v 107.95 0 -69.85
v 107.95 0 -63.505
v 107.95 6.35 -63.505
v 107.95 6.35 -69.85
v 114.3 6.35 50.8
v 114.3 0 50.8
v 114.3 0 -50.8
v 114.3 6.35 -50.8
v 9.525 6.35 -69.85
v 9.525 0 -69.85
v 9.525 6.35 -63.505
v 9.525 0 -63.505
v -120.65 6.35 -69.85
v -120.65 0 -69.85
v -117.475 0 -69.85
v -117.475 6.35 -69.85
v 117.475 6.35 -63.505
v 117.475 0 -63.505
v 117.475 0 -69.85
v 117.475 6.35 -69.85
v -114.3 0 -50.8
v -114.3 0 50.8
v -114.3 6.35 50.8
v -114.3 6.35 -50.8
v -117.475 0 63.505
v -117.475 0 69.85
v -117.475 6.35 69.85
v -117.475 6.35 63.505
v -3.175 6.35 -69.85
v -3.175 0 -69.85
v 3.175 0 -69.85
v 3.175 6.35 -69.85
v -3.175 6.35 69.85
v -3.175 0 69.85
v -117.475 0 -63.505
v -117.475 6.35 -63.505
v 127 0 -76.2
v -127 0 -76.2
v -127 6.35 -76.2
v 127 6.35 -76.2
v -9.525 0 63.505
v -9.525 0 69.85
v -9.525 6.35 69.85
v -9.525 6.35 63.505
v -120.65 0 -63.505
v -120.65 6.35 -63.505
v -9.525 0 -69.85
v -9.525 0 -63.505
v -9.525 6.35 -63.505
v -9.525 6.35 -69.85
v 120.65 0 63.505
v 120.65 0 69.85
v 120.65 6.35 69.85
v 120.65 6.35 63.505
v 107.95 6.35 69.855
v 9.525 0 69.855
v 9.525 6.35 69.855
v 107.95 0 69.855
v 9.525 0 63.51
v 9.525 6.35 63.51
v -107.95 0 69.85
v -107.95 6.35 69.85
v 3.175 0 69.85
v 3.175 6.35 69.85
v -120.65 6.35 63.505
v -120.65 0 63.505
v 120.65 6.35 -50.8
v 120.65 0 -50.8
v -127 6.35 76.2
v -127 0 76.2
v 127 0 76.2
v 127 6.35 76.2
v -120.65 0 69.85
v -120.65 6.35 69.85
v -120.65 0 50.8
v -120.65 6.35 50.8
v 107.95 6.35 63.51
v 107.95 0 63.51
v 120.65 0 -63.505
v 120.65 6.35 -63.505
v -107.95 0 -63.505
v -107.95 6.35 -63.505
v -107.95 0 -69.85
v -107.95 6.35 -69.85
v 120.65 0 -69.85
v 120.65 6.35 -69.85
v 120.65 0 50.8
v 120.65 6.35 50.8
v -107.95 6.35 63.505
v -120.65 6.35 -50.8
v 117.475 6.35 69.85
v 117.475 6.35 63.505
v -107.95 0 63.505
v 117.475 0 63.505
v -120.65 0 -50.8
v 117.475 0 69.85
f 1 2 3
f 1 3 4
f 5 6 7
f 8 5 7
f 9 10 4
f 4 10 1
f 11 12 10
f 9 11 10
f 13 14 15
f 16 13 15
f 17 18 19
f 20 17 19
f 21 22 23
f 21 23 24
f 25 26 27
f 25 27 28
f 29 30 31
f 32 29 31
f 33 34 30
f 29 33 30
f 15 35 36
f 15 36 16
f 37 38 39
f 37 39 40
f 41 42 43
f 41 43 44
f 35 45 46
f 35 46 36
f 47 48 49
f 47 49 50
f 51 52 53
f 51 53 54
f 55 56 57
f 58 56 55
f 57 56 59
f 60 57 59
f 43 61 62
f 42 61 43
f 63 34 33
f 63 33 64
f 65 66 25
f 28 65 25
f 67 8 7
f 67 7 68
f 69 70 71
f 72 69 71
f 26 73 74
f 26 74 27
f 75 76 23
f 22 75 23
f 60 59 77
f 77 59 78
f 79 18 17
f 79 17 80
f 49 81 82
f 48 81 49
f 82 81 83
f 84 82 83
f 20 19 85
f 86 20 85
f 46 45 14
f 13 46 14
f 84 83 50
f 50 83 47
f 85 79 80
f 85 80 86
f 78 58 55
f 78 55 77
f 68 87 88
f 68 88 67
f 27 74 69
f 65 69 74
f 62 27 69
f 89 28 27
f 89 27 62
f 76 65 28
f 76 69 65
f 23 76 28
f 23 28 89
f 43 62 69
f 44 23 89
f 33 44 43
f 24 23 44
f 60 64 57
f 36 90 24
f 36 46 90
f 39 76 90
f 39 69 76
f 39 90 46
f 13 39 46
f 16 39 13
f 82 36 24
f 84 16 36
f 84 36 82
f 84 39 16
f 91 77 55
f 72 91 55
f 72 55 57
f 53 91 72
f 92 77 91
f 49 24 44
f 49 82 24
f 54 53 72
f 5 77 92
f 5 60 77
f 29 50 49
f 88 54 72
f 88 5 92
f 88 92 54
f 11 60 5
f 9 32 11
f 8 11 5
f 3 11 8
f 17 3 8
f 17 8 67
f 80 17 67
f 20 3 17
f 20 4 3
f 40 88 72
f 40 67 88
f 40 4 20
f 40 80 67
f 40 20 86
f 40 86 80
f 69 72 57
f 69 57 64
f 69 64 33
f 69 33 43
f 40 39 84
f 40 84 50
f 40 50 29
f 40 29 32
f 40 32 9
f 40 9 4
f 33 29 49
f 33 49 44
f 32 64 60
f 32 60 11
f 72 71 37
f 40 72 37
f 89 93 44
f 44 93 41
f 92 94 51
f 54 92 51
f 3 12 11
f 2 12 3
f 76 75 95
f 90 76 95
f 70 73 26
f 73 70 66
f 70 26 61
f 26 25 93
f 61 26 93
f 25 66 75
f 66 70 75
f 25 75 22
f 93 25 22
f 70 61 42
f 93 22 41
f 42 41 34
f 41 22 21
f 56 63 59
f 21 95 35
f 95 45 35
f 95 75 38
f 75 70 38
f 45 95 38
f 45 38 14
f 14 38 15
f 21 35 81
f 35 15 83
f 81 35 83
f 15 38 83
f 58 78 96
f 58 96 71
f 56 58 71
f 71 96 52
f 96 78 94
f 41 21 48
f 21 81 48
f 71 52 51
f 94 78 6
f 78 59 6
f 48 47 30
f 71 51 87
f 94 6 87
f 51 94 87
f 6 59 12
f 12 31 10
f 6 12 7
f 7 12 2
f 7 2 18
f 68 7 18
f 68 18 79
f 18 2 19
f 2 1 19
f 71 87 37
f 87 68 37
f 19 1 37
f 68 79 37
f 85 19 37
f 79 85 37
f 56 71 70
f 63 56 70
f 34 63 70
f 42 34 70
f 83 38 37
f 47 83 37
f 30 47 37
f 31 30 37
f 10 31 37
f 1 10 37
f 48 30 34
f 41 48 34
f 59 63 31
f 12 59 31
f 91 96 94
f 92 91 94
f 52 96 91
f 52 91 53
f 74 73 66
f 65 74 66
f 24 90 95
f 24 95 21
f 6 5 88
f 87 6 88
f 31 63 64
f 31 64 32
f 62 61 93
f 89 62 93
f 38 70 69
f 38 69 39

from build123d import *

# Parameters (mm, degrees)
SKETCH1_W           = 254
SKETCH1_H           = 152.4
SKETCH1_W_2         = 6.35
SKETCH1_H_2         = 101.6
SKETCH1_H_3         = 139.7
SKETCH1_W_3         = 98.425
SKETCH1_H_4         = 6.34492
SKETCH1_W_4         = 3.175
BOSS_EXTRUDE1_DEPTH = 6.35


with BuildPart() as part:
    # Sketch1 → Boss-Extrude1 (new body)
    with BuildSketch(Plane(origin=(0, 0, 0), x_dir=(1, 0, 0), z_dir=(0, 1, 0))):
        Rectangle(SKETCH1_W, SKETCH1_H)
        with Locations((117.475, 0)):
            Rectangle(SKETCH1_W_2, SKETCH1_H_2, mode=Mode.SUBTRACT)
        Rectangle(SKETCH1_W_2, SKETCH1_H_3, mode=Mode.SUBTRACT)
        with Locations((-117.475, 0)):
            Rectangle(SKETCH1_W_2, SKETCH1_H_2, mode=Mode.SUBTRACT)
        with Locations((-58.7375, 66.67754)):
            Rectangle(SKETCH1_W_3, SKETCH1_H_4, mode=Mode.SUBTRACT)
        with Locations((58.7375, -66.68262)):
            Rectangle(SKETCH1_W_3, SKETCH1_H_4, mode=Mode.SUBTRACT)
        with Locations((58.7375, 66.67754)):
            Rectangle(SKETCH1_W_3, SKETCH1_H_4, mode=Mode.SUBTRACT)
        with Locations((-58.7375, -66.67754)):
            Rectangle(SKETCH1_W_3, SKETCH1_H_4, mode=Mode.SUBTRACT)
        with Locations((-119.0625, -66.67754)):
            Rectangle(SKETCH1_W_4, SKETCH1_H_4, mode=Mode.SUBTRACT)
        with Locations((119.0625, -66.67754)):
            Rectangle(SKETCH1_W_4, SKETCH1_H_4, mode=Mode.SUBTRACT)
        with Locations((-119.0625, 66.67754)):
            Rectangle(SKETCH1_W_4, SKETCH1_H_4, mode=Mode.SUBTRACT)
        with Locations((119.0625, 66.67754)):
            Rectangle(SKETCH1_W_4, SKETCH1_H_4, mode=Mode.SUBTRACT)
    extrude(amount=BOSS_EXTRUDE1_DEPTH)


solid = part.part
